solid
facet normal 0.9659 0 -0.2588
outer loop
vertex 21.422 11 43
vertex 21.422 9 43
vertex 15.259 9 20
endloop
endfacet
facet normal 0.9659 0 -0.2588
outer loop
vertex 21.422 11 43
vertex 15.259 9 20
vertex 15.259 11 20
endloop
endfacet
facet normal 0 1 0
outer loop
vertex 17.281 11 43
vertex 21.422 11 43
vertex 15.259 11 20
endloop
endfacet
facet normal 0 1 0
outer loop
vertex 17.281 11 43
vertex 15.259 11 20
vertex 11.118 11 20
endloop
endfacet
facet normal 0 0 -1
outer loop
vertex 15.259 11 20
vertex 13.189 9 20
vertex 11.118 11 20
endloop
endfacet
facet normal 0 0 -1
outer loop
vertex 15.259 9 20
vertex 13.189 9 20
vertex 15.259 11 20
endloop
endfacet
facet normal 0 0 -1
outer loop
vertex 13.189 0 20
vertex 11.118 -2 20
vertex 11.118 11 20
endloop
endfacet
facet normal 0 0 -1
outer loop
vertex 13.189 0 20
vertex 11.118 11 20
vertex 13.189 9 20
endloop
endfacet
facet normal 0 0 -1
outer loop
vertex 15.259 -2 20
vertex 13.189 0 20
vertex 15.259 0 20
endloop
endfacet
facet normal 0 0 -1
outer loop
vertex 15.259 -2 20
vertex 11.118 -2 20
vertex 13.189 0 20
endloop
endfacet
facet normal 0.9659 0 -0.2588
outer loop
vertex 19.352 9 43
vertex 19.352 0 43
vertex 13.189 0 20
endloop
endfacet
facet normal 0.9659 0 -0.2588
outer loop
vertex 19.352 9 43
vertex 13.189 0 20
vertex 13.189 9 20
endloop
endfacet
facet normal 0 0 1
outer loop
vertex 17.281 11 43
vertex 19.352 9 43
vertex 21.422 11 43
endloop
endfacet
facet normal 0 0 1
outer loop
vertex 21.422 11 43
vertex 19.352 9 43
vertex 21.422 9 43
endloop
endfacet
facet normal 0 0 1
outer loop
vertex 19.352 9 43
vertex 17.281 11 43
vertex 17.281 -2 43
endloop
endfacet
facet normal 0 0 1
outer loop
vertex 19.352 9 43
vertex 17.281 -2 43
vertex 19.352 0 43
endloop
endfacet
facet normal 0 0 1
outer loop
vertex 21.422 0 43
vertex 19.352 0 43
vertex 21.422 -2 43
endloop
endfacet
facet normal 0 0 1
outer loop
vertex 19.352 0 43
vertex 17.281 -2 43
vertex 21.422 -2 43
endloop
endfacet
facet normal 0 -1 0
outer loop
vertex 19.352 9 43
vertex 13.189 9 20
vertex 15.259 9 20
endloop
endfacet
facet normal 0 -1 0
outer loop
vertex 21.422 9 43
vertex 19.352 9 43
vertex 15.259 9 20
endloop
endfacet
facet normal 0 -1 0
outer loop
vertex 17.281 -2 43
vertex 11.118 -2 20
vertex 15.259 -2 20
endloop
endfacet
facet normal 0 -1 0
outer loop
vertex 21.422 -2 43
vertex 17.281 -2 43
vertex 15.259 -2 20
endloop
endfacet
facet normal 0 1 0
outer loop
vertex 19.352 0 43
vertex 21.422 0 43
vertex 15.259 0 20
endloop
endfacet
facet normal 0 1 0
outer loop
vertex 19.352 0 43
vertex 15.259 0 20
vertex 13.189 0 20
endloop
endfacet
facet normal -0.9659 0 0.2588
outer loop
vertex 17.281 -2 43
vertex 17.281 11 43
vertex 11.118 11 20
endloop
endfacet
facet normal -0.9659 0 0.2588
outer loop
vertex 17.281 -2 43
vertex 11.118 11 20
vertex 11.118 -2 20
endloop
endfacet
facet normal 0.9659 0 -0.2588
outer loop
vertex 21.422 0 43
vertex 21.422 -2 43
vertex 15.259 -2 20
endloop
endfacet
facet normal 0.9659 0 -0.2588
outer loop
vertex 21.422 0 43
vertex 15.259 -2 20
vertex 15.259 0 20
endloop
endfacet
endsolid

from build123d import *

# Parameters (mm, degrees)
SKETCH024_W                = 7
SKETCH024_H                = 2
SKETCH024_W_2              = 8
SKETCH024_H_2              = 4
EXTRUDE020_DEPTH           = 5
EXTRUDE020_DEPTH_BACK      = 14
EXTRUDE014_DEPTH           = 27
EXTRUDE014_PLACEMENT_ANGLE = 15


with BuildPart() as extrude020:
    # Sketch024 → Extrude020 (new body, two sides)
    with BuildSketch(Plane.XZ) as extrude020_sk:
        with Locations((13.5, 19)):
            Rectangle(SKETCH024_W, SKETCH024_H)
        with Locations((20, 45)):
            Rectangle(SKETCH024_W_2, SKETCH024_H_2)
    extrude(amount=EXTRUDE020_DEPTH)
    extrude(extrude020_sk.sketch, amount=-EXTRUDE020_DEPTH_BACK)


with BuildPart() as cut001:
    # Sketch018 → Extrude014 (new body)
    with BuildSketch(Plane.XY.offset(45)):
        Polygon((20, 9), (22, 9), (22, 11), (18, 11), (18, -2), (22, -2), (22, 0), (20, 0), align=None)
    extrude(amount=-EXTRUDE014_DEPTH)


with BuildPart() as cut001_1:
    # Extrude014 placement: moved
    add(cut001.part.moved(Location((-11, 0, 7))).rotate(Axis((-11, 0, 7), (0, 1, 0)), EXTRUDE014_PLACEMENT_ANGLE))

    # Cut001: cut Extrude020
    add(extrude020.part, mode=Mode.SUBTRACT)


solid = cut001_1.part
